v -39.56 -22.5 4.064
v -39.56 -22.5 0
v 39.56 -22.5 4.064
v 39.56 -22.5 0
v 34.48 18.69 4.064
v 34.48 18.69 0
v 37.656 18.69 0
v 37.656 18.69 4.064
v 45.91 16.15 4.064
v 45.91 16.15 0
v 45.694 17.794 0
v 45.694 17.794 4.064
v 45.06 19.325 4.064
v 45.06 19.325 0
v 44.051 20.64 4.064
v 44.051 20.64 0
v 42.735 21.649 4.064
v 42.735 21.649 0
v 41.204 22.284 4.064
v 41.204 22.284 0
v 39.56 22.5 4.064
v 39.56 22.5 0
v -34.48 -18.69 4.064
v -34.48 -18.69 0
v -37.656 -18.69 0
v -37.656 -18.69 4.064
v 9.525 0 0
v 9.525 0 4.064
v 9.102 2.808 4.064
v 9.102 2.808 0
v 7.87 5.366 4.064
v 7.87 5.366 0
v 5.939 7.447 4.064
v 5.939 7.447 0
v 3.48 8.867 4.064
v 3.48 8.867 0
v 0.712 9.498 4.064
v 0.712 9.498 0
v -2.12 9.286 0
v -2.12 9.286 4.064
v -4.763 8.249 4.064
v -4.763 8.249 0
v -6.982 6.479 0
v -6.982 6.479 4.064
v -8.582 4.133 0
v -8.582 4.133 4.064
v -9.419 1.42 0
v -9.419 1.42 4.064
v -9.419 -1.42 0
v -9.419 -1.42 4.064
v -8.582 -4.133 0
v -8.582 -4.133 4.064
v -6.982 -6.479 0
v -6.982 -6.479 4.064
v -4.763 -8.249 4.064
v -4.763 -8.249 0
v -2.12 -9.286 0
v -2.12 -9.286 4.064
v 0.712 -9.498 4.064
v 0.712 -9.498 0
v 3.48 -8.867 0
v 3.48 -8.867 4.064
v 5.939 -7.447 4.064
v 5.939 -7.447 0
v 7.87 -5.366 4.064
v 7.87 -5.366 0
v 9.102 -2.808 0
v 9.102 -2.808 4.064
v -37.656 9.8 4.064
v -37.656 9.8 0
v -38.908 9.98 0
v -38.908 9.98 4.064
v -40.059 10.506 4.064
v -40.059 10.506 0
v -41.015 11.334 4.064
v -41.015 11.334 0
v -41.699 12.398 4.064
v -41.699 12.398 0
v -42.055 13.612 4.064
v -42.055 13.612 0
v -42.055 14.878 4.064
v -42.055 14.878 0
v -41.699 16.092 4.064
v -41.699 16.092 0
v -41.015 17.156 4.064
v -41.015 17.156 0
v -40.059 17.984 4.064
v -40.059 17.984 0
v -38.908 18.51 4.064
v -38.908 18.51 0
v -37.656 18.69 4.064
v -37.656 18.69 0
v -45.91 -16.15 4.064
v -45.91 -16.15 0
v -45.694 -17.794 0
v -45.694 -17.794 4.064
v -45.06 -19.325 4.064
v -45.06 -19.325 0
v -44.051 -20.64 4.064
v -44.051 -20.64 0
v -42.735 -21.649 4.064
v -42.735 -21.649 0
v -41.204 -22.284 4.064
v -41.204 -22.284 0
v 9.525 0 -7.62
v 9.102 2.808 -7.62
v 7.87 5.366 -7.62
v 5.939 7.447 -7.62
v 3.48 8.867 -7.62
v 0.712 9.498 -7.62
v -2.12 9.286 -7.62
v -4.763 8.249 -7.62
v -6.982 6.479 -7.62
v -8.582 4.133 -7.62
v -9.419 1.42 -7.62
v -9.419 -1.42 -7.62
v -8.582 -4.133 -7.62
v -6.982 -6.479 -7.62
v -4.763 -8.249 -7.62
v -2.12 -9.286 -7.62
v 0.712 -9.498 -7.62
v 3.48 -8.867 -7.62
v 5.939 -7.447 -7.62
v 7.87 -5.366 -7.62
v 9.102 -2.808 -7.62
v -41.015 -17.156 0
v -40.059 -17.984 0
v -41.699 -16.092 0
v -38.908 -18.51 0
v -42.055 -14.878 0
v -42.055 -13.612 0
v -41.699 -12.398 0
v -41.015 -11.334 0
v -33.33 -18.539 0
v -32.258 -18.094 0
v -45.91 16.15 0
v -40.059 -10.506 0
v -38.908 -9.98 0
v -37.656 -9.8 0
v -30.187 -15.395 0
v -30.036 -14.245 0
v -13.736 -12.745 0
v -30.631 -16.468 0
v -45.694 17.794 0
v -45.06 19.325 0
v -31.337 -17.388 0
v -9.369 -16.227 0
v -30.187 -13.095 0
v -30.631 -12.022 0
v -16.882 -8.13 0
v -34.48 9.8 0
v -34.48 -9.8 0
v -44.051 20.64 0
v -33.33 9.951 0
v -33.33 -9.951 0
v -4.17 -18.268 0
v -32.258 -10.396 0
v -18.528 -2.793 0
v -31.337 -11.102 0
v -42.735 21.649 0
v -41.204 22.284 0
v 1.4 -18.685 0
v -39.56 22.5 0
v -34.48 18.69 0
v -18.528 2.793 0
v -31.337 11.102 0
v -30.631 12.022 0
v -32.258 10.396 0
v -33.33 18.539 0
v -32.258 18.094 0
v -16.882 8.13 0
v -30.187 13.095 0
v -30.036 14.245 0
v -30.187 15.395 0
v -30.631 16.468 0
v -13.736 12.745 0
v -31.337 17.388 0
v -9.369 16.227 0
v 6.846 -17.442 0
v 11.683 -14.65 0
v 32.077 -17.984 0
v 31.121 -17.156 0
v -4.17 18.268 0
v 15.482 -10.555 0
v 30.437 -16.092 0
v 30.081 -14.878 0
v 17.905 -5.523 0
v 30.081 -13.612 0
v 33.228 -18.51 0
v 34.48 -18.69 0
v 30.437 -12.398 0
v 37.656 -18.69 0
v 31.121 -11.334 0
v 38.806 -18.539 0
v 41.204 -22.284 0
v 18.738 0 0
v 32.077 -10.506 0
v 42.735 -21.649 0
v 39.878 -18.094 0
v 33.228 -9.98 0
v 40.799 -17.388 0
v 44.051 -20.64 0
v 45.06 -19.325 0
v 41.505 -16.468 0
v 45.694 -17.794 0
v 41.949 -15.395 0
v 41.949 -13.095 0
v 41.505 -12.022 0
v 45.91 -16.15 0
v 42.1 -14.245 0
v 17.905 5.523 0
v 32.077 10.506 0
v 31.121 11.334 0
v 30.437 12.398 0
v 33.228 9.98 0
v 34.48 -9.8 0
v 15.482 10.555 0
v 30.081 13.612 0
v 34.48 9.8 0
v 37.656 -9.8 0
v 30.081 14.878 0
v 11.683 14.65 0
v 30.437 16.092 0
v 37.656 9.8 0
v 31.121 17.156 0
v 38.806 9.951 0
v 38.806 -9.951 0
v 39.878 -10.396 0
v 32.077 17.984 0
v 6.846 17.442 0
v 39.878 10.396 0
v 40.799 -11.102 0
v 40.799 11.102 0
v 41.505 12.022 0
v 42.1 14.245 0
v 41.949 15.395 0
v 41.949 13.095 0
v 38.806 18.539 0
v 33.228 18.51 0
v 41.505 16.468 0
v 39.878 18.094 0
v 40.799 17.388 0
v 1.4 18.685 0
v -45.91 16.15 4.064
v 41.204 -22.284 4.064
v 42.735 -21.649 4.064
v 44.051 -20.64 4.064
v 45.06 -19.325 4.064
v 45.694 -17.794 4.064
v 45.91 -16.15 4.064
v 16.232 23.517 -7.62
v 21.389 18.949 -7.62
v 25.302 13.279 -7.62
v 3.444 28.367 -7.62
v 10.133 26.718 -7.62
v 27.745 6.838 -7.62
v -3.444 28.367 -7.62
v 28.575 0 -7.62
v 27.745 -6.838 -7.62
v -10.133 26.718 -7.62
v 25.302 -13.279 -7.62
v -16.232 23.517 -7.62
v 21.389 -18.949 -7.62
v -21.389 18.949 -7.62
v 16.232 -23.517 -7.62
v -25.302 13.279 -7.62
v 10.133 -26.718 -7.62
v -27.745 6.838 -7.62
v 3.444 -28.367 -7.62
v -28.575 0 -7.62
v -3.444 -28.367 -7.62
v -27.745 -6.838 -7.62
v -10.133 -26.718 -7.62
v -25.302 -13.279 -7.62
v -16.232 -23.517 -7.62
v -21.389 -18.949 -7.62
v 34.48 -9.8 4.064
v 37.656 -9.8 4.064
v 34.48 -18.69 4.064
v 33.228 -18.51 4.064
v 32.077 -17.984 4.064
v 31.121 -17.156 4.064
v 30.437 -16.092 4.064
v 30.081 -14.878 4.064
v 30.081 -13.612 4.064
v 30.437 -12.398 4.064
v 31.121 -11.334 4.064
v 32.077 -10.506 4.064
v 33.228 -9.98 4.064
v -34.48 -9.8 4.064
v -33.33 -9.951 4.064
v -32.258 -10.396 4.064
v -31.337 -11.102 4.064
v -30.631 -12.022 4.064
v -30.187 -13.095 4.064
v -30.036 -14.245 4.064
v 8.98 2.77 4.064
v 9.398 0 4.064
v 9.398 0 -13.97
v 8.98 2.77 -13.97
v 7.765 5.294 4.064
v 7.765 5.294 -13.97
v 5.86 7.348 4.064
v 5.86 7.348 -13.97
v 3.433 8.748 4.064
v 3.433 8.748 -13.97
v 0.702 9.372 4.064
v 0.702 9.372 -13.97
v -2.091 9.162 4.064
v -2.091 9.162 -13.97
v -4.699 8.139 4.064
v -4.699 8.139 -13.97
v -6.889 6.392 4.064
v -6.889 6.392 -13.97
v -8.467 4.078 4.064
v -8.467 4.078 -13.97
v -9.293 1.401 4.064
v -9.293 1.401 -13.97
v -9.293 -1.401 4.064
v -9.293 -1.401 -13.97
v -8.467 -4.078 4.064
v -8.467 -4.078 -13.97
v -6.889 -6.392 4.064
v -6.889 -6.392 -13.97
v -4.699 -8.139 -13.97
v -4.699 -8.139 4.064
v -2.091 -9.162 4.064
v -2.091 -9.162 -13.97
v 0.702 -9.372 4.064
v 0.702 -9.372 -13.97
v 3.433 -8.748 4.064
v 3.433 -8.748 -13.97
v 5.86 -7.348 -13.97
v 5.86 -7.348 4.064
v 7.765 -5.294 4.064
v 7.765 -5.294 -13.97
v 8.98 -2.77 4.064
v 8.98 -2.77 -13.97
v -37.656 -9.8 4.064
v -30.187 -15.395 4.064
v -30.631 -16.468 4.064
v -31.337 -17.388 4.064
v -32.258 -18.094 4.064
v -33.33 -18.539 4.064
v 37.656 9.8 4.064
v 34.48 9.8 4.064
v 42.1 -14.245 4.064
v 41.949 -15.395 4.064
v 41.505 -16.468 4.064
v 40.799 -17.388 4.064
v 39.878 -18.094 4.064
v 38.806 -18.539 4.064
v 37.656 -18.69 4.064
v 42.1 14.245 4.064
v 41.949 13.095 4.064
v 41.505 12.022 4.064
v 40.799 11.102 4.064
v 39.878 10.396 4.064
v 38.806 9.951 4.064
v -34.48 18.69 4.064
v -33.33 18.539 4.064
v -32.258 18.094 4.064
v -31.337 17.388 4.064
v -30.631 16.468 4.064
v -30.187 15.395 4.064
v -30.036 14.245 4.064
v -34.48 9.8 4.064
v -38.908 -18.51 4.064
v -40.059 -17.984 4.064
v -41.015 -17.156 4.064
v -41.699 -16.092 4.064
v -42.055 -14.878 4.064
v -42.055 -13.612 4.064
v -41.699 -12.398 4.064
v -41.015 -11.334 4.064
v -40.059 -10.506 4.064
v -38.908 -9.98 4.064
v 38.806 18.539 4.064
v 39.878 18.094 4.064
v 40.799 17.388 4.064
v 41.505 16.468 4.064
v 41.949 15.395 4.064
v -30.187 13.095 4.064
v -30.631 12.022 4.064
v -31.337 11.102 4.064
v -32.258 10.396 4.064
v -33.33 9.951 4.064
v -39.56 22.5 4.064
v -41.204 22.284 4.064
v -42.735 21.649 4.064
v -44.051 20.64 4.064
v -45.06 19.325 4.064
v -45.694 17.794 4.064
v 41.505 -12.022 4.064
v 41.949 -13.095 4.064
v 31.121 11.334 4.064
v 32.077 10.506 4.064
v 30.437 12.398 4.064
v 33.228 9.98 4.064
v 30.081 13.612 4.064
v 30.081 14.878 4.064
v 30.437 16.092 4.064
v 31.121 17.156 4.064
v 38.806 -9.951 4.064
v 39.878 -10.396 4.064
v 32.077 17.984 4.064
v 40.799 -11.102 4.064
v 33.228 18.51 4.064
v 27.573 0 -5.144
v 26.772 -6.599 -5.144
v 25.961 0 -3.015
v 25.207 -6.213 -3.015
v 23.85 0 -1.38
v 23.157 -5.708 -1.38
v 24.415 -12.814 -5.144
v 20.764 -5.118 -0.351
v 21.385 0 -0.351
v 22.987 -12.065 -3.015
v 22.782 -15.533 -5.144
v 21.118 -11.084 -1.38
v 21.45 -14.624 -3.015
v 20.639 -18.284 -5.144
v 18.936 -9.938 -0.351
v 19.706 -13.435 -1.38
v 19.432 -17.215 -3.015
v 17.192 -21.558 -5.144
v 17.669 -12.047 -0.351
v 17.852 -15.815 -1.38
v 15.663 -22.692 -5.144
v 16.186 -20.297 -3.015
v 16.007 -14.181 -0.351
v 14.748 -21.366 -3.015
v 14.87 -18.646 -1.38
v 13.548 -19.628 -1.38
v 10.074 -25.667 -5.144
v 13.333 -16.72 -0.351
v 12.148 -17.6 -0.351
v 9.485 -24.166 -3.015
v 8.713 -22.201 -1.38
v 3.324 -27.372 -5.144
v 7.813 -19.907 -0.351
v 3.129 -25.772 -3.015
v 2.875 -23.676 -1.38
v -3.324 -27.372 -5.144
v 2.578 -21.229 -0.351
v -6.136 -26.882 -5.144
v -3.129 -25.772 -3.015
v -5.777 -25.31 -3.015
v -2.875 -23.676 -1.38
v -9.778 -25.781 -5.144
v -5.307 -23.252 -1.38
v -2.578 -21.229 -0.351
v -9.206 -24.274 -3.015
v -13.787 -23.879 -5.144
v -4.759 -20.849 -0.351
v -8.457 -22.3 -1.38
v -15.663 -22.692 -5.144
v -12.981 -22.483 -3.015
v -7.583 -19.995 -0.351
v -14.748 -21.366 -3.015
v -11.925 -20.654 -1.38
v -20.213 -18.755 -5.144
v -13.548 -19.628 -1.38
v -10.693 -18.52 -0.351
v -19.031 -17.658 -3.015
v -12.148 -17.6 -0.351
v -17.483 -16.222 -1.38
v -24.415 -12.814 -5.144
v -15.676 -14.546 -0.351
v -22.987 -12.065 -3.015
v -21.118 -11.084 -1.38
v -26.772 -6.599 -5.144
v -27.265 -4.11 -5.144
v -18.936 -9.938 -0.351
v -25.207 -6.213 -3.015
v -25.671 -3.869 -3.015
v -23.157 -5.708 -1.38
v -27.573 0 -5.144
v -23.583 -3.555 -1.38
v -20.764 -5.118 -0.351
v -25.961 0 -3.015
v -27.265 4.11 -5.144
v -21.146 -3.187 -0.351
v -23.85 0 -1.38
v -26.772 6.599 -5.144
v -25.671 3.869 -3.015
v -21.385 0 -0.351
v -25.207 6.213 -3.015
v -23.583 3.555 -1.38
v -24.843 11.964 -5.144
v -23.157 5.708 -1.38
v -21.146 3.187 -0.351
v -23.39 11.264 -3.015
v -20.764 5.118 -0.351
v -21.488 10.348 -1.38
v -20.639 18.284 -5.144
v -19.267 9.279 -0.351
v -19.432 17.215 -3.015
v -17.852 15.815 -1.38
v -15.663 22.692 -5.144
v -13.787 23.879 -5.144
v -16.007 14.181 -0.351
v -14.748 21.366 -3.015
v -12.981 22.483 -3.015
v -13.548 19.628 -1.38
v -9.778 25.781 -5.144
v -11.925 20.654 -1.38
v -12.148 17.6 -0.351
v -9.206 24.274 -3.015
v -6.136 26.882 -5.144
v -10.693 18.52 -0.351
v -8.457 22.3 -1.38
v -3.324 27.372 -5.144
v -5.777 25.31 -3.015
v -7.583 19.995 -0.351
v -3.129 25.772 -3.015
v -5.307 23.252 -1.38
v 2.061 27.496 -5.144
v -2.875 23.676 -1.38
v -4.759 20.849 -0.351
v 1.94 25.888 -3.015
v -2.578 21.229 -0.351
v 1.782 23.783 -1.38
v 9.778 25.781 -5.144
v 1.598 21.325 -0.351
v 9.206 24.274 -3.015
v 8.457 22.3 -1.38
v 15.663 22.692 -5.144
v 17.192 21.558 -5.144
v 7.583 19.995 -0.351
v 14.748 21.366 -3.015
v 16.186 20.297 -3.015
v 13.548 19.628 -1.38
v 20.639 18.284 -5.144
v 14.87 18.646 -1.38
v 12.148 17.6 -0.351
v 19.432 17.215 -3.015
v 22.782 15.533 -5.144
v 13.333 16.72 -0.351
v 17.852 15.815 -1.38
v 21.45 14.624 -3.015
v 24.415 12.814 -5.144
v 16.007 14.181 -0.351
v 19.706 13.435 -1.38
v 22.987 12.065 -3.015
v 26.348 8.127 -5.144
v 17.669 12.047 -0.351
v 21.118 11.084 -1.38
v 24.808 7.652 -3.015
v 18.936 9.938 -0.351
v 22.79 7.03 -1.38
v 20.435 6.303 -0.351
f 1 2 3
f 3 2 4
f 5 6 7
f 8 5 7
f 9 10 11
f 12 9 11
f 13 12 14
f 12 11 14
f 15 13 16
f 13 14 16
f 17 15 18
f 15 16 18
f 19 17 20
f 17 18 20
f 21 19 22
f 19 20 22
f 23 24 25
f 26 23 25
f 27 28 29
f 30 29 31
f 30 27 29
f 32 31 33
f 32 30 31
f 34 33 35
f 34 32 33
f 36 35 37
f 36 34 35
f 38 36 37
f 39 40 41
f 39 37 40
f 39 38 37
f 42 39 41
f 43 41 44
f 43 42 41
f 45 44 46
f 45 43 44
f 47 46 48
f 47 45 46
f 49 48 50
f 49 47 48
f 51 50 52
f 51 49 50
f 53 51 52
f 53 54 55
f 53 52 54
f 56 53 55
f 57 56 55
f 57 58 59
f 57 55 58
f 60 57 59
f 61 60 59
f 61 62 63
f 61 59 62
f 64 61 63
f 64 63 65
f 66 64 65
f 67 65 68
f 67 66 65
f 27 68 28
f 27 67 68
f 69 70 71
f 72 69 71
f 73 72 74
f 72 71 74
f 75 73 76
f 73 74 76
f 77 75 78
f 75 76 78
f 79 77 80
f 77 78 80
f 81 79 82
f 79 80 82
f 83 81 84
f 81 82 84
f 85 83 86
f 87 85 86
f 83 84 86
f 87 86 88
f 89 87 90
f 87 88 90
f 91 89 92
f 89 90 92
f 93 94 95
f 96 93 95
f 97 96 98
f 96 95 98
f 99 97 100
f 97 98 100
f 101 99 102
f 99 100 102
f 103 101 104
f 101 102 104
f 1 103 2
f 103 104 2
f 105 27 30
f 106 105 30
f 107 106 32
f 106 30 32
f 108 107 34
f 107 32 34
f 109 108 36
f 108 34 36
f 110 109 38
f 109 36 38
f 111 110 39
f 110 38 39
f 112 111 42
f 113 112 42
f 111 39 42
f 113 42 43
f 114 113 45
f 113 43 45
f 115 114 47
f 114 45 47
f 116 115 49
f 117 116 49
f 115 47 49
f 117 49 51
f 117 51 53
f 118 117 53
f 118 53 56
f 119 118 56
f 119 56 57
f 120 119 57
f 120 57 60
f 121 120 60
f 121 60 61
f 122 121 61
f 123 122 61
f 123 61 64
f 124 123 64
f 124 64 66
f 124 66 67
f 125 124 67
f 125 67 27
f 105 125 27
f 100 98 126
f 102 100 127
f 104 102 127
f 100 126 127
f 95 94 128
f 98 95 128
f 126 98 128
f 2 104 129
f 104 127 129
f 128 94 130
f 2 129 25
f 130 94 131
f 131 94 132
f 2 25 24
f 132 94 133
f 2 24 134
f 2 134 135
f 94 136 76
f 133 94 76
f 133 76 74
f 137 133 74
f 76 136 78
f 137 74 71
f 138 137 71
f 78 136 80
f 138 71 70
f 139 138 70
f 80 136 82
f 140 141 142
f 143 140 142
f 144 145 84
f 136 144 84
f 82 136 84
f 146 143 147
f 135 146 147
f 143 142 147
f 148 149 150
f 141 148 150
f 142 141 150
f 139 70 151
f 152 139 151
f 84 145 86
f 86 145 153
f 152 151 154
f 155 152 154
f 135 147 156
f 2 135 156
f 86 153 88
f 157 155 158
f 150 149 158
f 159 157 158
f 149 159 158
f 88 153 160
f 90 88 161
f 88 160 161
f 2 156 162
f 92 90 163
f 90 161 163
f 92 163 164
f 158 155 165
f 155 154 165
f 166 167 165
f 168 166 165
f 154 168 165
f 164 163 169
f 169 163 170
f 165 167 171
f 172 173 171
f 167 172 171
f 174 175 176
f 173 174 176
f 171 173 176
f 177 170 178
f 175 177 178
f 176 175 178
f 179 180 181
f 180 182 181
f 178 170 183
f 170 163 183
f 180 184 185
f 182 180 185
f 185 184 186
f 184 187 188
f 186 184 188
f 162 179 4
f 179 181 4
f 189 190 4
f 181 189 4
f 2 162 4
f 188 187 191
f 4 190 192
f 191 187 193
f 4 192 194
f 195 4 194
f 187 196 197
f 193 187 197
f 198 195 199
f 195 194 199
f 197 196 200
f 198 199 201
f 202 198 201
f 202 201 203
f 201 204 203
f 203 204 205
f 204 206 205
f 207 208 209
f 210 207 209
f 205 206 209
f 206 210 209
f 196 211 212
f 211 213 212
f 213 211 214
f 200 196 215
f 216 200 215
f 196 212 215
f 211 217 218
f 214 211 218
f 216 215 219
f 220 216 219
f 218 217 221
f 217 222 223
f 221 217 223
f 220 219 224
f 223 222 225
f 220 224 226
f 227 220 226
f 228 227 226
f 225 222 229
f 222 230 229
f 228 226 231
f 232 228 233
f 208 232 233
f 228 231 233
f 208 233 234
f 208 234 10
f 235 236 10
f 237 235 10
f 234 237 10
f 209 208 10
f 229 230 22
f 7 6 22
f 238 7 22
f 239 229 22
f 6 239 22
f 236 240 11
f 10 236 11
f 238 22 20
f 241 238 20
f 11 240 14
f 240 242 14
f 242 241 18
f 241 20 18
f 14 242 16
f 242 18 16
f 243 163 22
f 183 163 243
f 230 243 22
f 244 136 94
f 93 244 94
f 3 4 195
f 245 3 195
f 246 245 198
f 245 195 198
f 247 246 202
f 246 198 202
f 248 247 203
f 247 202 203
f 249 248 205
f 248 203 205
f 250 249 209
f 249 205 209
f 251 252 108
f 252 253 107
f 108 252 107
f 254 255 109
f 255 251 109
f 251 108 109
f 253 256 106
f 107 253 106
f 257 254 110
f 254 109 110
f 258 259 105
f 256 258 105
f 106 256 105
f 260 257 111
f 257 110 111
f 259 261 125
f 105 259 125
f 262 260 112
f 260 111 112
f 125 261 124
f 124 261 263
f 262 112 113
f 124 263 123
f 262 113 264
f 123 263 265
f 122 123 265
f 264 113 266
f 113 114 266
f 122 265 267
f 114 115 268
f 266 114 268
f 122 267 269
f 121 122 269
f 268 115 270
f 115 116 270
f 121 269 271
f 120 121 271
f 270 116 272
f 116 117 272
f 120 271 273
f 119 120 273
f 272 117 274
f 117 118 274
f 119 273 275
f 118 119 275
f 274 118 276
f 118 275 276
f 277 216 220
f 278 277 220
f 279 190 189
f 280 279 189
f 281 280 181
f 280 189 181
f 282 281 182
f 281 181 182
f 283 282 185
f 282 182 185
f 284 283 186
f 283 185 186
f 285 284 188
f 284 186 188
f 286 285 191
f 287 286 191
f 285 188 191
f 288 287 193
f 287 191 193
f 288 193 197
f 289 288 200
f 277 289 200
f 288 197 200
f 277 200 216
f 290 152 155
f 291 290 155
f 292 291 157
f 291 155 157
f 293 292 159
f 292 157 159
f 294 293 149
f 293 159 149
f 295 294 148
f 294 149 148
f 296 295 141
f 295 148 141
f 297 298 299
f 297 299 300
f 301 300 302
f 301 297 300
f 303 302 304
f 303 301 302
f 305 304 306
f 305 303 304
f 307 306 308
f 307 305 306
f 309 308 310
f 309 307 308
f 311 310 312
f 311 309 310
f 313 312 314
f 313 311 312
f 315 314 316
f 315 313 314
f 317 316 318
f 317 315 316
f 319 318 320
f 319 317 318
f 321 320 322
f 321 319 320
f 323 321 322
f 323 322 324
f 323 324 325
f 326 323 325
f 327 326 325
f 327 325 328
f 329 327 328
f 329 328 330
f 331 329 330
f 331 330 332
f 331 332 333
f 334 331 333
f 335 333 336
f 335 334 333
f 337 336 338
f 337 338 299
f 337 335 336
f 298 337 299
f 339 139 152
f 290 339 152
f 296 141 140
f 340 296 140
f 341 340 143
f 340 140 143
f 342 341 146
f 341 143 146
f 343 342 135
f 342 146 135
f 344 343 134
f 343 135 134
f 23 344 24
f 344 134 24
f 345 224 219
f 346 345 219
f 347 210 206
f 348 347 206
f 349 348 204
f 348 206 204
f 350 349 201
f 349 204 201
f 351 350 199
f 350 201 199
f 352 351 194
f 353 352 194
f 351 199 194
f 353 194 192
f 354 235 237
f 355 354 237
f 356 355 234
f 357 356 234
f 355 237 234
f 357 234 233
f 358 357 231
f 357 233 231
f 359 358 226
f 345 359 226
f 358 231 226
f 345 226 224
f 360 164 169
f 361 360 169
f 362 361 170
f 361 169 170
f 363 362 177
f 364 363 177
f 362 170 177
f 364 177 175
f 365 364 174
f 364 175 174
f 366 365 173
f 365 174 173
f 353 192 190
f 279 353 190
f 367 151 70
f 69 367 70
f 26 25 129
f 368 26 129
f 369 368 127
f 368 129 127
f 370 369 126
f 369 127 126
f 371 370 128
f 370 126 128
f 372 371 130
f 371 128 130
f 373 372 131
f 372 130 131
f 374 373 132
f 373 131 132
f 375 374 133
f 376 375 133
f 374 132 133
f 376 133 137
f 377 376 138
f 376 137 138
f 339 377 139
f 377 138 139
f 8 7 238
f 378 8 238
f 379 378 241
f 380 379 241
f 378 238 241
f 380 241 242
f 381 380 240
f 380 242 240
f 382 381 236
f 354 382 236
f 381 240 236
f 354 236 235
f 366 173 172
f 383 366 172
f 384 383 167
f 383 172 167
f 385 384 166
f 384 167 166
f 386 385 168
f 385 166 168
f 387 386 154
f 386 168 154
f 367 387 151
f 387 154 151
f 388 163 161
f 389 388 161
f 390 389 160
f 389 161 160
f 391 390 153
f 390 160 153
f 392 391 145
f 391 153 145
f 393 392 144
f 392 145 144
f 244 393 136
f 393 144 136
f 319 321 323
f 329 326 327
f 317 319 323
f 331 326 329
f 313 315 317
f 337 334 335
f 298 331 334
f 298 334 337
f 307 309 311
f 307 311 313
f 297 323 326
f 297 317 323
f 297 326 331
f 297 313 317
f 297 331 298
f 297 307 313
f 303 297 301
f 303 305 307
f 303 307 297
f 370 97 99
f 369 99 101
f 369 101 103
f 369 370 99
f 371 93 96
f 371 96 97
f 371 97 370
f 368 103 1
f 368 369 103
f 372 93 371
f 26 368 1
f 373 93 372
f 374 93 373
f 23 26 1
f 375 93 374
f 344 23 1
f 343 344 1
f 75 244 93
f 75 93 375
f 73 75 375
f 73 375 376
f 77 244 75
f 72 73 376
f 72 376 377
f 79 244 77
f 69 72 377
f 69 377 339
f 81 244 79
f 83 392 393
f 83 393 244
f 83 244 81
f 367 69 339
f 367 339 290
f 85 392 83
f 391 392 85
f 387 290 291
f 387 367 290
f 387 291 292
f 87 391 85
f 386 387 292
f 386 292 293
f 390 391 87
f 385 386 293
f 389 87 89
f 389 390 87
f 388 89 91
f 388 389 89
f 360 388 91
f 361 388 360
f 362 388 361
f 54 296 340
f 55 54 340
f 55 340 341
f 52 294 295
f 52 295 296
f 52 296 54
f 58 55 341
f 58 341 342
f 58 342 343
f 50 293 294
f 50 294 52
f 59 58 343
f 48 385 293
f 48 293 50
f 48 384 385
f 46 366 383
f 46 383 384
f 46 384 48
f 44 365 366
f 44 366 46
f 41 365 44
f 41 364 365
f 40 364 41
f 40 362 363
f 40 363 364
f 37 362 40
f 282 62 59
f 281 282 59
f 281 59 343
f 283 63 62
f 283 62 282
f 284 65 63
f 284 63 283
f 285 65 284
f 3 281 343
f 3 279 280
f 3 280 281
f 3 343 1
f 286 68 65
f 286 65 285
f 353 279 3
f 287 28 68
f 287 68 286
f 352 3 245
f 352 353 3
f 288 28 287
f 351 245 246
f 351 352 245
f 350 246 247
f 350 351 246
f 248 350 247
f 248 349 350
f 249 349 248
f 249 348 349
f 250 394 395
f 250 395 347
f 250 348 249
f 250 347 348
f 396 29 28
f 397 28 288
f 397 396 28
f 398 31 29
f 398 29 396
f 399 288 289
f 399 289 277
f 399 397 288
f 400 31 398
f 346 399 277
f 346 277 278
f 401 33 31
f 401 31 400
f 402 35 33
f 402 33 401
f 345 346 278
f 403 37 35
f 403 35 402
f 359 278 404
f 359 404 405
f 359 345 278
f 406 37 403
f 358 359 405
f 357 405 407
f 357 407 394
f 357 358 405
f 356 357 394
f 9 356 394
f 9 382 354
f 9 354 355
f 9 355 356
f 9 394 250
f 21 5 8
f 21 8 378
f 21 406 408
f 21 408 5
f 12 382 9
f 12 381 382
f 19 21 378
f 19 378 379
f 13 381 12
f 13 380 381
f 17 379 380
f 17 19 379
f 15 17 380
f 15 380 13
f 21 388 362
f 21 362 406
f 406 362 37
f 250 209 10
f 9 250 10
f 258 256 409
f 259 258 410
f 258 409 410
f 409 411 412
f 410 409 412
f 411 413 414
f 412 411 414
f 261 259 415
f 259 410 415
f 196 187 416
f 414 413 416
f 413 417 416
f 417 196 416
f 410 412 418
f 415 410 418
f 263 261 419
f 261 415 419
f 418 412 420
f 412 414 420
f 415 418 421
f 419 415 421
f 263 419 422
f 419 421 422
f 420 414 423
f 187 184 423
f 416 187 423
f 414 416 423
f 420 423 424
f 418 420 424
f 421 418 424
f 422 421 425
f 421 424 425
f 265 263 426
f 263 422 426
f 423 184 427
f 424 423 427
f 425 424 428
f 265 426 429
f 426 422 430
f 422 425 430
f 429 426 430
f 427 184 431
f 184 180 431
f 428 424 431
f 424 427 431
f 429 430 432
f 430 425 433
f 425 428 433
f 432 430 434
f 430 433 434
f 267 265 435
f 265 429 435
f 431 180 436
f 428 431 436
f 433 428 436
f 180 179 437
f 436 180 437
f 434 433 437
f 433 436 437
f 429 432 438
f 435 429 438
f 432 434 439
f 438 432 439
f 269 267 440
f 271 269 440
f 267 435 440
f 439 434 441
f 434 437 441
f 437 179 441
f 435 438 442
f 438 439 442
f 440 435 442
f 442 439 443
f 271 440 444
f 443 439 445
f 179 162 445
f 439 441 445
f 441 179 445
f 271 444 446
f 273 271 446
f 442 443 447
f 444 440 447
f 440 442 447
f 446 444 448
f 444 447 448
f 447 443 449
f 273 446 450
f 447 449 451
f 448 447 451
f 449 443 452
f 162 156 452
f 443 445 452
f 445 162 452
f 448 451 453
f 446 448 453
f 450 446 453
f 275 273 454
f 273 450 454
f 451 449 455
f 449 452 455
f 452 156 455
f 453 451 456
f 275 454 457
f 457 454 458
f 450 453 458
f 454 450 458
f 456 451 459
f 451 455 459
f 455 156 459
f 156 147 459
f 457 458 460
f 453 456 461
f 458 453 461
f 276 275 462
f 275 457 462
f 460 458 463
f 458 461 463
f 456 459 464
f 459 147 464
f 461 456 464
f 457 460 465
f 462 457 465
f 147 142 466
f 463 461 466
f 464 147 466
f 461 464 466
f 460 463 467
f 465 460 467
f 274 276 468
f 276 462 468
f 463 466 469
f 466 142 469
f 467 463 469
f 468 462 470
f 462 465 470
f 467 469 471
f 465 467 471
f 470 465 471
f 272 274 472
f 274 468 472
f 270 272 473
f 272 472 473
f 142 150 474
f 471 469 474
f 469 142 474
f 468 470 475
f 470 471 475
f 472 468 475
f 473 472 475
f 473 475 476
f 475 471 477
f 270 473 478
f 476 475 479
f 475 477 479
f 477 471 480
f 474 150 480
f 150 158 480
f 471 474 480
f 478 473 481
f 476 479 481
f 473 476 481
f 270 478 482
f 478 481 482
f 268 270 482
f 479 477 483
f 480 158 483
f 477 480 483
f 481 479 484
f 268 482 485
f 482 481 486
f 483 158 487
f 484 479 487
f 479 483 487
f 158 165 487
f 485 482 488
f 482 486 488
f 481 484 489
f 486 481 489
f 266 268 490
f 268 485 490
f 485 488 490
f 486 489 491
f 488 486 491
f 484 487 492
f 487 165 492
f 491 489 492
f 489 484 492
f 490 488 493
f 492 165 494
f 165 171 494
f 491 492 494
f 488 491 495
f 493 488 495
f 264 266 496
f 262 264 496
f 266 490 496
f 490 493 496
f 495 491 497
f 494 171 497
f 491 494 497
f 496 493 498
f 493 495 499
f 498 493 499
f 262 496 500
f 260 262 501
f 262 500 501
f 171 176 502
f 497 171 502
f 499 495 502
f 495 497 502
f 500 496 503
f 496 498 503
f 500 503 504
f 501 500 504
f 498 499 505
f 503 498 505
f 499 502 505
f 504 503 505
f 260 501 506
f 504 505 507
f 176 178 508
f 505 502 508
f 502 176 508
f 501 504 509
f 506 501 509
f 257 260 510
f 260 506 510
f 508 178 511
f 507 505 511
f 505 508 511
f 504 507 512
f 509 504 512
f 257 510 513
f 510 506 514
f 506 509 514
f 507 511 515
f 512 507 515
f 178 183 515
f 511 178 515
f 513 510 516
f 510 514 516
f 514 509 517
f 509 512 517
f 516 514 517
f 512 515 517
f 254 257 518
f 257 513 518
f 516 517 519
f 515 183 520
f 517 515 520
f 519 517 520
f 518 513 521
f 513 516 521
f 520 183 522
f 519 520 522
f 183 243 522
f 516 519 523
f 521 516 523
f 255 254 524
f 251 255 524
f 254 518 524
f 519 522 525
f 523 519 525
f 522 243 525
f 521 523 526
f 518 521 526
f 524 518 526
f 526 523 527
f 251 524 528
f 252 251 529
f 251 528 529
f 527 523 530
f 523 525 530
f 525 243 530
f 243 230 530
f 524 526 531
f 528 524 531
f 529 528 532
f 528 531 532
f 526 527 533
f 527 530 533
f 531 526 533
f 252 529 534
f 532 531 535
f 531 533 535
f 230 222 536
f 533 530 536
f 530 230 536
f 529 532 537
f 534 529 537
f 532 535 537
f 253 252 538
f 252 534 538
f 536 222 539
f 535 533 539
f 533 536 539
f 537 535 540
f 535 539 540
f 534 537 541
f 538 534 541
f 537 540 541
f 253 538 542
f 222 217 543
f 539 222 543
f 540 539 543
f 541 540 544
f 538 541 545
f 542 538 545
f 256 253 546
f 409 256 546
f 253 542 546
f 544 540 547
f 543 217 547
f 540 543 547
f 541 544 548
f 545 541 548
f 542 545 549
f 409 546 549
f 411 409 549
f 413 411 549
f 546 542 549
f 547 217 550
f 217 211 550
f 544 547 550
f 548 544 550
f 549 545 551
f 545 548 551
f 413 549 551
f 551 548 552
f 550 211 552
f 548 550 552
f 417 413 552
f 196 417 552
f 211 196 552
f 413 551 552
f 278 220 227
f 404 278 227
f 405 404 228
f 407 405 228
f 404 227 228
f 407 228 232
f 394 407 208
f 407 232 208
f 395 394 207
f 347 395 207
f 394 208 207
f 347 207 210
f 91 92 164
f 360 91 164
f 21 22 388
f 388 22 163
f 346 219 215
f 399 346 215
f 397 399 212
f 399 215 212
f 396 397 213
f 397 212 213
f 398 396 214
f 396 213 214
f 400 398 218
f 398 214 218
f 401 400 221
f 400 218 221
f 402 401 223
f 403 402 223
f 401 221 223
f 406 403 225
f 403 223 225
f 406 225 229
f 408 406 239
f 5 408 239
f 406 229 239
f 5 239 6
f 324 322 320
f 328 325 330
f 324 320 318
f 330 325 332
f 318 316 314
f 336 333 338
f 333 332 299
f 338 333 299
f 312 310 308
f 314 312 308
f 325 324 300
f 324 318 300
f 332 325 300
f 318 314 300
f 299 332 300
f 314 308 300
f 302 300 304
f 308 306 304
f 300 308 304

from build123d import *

# Parameters (mm, degrees)
F1_DEPTH      = 4.064
F4_R          = 9.525
F5_DEPTH      = 7.621
F5_DEPTH_BACK = 4.065
F6_R          = 9.398
F8_DEPTH      = 18.034


with BuildPart() as f1:
    # F0 (on Top) → F1 (new body)
    with BuildSketch(Plane.XY):
        with BuildLine():
            Line((39.5605, 22.5), (-39.5605, 22.5))
            ThreePointArc((-39.5605, 22.5), (-44.0506280605, 20.6401280605), (-45.9105, 16.15))
            Line((-45.9105, 16.15), (-45.9105, -16.15))
            ThreePointArc((-45.9105, -16.15), (-44.0506280605, -20.6401280605), (-39.5605, -22.5))
            Line((-39.5605, -22.5), (39.5605, -22.5))
            ThreePointArc((39.5605, -22.5), (44.0506280605, -20.6401280605), (45.9105, -16.15))
            Line((45.9105, -16.15), (45.9105, 16.15))
            ThreePointArc((45.9105, 16.15), (44.0506280605, 20.6401280605), (39.5605, 22.5))
        make_face()
        with BuildLine():
            ThreePointArc((-34.4805, -9.8), (-31.3374103576, -11.1019103576), (-30.0355, -14.245))
            ThreePointArc((-30.0355, -14.245), (-31.3374103576, -17.3880896424), (-34.4805, -18.69))
            Line((-34.4805, -18.69), (-37.6555, -18.69))
            ThreePointArc((-37.6555, -18.69), (-42.1005, -14.245), (-37.6555, -9.8))
            Line((-37.6555, -9.8), (-34.4805, -9.8))
        make_face(mode=Mode.SUBTRACT)
        with BuildLine():
            ThreePointArc((34.4805, -18.69), (30.0355, -14.245), (34.4805, -9.8))
            Line((34.4805, -9.8), (37.6555, -9.8))
            ThreePointArc((37.6555, -9.8), (40.7985896424, -11.1019103576), (42.1005, -14.245))
            ThreePointArc((42.1005, -14.245), (40.7985896424, -17.3880896424), (37.6555, -18.69))
            Line((37.6555, -18.69), (34.4805, -18.69))
        make_face(mode=Mode.SUBTRACT)
        with BuildLine():
            ThreePointArc((-34.4805, 18.69), (-31.3374103576, 17.3880896424), (-30.0355, 14.245))
            ThreePointArc((-30.0355, 14.245), (-31.3374103576, 11.1019103576), (-34.4805, 9.8))
            Line((-34.4805, 9.8), (-37.6555, 9.8))
            ThreePointArc((-37.6555, 9.8), (-42.1005, 14.245), (-37.6555, 18.69))
            Line((-37.6555, 18.69), (-34.4805, 18.69))
        make_face(mode=Mode.SUBTRACT)
        with BuildLine():
            ThreePointArc((37.6555, 18.69), (40.7985896424, 17.3880896424), (42.1005, 14.245))
            ThreePointArc((42.1005, 14.245), (40.7985896424, 11.1019103576), (37.6555, 9.8))
            Line((37.6555, 9.8), (34.4805, 9.8))
            ThreePointArc((34.4805, 9.8), (30.0355, 14.245), (34.4805, 18.69))
            Line((34.4805, 18.69), (37.6555, 18.69))
        make_face(mode=Mode.SUBTRACT)
    extrude(amount=F1_DEPTH)

    # F2 (on Front) → F3 (revolve)
    with BuildSketch(Plane.XZ):
        with BuildLine():
            Line((18.7376223006, 0), (0, 0))
            Line((0, 0), (0, -7.62))
            Line((0, -7.62), (28.575, -7.62))
            ThreePointArc((28.575, -7.62), (24.9593262473, -2.1278147432), (18.7376223006, 0))
        make_face()
    revolve(axis=Axis((0, 0, -3.81), (0, 0, -1)))

    # F4 (on Top) → F5 (cut, two sides)
    with BuildSketch(Plane.XY) as f5_sk:
        Circle(F4_R)
    extrude(amount=-F5_DEPTH, mode=Mode.SUBTRACT)
    extrude(f5_sk.sketch, amount=F5_DEPTH_BACK, mode=Mode.SUBTRACT)


with BuildPart() as f8:
    # F6 (on face) → F8 (new body, through all)
    with BuildSketch(Plane.XY.offset(4.064)):
        Circle(F6_R)
    extrude(amount=-F8_DEPTH)


solid = Compound([f1.part, f8.part])
